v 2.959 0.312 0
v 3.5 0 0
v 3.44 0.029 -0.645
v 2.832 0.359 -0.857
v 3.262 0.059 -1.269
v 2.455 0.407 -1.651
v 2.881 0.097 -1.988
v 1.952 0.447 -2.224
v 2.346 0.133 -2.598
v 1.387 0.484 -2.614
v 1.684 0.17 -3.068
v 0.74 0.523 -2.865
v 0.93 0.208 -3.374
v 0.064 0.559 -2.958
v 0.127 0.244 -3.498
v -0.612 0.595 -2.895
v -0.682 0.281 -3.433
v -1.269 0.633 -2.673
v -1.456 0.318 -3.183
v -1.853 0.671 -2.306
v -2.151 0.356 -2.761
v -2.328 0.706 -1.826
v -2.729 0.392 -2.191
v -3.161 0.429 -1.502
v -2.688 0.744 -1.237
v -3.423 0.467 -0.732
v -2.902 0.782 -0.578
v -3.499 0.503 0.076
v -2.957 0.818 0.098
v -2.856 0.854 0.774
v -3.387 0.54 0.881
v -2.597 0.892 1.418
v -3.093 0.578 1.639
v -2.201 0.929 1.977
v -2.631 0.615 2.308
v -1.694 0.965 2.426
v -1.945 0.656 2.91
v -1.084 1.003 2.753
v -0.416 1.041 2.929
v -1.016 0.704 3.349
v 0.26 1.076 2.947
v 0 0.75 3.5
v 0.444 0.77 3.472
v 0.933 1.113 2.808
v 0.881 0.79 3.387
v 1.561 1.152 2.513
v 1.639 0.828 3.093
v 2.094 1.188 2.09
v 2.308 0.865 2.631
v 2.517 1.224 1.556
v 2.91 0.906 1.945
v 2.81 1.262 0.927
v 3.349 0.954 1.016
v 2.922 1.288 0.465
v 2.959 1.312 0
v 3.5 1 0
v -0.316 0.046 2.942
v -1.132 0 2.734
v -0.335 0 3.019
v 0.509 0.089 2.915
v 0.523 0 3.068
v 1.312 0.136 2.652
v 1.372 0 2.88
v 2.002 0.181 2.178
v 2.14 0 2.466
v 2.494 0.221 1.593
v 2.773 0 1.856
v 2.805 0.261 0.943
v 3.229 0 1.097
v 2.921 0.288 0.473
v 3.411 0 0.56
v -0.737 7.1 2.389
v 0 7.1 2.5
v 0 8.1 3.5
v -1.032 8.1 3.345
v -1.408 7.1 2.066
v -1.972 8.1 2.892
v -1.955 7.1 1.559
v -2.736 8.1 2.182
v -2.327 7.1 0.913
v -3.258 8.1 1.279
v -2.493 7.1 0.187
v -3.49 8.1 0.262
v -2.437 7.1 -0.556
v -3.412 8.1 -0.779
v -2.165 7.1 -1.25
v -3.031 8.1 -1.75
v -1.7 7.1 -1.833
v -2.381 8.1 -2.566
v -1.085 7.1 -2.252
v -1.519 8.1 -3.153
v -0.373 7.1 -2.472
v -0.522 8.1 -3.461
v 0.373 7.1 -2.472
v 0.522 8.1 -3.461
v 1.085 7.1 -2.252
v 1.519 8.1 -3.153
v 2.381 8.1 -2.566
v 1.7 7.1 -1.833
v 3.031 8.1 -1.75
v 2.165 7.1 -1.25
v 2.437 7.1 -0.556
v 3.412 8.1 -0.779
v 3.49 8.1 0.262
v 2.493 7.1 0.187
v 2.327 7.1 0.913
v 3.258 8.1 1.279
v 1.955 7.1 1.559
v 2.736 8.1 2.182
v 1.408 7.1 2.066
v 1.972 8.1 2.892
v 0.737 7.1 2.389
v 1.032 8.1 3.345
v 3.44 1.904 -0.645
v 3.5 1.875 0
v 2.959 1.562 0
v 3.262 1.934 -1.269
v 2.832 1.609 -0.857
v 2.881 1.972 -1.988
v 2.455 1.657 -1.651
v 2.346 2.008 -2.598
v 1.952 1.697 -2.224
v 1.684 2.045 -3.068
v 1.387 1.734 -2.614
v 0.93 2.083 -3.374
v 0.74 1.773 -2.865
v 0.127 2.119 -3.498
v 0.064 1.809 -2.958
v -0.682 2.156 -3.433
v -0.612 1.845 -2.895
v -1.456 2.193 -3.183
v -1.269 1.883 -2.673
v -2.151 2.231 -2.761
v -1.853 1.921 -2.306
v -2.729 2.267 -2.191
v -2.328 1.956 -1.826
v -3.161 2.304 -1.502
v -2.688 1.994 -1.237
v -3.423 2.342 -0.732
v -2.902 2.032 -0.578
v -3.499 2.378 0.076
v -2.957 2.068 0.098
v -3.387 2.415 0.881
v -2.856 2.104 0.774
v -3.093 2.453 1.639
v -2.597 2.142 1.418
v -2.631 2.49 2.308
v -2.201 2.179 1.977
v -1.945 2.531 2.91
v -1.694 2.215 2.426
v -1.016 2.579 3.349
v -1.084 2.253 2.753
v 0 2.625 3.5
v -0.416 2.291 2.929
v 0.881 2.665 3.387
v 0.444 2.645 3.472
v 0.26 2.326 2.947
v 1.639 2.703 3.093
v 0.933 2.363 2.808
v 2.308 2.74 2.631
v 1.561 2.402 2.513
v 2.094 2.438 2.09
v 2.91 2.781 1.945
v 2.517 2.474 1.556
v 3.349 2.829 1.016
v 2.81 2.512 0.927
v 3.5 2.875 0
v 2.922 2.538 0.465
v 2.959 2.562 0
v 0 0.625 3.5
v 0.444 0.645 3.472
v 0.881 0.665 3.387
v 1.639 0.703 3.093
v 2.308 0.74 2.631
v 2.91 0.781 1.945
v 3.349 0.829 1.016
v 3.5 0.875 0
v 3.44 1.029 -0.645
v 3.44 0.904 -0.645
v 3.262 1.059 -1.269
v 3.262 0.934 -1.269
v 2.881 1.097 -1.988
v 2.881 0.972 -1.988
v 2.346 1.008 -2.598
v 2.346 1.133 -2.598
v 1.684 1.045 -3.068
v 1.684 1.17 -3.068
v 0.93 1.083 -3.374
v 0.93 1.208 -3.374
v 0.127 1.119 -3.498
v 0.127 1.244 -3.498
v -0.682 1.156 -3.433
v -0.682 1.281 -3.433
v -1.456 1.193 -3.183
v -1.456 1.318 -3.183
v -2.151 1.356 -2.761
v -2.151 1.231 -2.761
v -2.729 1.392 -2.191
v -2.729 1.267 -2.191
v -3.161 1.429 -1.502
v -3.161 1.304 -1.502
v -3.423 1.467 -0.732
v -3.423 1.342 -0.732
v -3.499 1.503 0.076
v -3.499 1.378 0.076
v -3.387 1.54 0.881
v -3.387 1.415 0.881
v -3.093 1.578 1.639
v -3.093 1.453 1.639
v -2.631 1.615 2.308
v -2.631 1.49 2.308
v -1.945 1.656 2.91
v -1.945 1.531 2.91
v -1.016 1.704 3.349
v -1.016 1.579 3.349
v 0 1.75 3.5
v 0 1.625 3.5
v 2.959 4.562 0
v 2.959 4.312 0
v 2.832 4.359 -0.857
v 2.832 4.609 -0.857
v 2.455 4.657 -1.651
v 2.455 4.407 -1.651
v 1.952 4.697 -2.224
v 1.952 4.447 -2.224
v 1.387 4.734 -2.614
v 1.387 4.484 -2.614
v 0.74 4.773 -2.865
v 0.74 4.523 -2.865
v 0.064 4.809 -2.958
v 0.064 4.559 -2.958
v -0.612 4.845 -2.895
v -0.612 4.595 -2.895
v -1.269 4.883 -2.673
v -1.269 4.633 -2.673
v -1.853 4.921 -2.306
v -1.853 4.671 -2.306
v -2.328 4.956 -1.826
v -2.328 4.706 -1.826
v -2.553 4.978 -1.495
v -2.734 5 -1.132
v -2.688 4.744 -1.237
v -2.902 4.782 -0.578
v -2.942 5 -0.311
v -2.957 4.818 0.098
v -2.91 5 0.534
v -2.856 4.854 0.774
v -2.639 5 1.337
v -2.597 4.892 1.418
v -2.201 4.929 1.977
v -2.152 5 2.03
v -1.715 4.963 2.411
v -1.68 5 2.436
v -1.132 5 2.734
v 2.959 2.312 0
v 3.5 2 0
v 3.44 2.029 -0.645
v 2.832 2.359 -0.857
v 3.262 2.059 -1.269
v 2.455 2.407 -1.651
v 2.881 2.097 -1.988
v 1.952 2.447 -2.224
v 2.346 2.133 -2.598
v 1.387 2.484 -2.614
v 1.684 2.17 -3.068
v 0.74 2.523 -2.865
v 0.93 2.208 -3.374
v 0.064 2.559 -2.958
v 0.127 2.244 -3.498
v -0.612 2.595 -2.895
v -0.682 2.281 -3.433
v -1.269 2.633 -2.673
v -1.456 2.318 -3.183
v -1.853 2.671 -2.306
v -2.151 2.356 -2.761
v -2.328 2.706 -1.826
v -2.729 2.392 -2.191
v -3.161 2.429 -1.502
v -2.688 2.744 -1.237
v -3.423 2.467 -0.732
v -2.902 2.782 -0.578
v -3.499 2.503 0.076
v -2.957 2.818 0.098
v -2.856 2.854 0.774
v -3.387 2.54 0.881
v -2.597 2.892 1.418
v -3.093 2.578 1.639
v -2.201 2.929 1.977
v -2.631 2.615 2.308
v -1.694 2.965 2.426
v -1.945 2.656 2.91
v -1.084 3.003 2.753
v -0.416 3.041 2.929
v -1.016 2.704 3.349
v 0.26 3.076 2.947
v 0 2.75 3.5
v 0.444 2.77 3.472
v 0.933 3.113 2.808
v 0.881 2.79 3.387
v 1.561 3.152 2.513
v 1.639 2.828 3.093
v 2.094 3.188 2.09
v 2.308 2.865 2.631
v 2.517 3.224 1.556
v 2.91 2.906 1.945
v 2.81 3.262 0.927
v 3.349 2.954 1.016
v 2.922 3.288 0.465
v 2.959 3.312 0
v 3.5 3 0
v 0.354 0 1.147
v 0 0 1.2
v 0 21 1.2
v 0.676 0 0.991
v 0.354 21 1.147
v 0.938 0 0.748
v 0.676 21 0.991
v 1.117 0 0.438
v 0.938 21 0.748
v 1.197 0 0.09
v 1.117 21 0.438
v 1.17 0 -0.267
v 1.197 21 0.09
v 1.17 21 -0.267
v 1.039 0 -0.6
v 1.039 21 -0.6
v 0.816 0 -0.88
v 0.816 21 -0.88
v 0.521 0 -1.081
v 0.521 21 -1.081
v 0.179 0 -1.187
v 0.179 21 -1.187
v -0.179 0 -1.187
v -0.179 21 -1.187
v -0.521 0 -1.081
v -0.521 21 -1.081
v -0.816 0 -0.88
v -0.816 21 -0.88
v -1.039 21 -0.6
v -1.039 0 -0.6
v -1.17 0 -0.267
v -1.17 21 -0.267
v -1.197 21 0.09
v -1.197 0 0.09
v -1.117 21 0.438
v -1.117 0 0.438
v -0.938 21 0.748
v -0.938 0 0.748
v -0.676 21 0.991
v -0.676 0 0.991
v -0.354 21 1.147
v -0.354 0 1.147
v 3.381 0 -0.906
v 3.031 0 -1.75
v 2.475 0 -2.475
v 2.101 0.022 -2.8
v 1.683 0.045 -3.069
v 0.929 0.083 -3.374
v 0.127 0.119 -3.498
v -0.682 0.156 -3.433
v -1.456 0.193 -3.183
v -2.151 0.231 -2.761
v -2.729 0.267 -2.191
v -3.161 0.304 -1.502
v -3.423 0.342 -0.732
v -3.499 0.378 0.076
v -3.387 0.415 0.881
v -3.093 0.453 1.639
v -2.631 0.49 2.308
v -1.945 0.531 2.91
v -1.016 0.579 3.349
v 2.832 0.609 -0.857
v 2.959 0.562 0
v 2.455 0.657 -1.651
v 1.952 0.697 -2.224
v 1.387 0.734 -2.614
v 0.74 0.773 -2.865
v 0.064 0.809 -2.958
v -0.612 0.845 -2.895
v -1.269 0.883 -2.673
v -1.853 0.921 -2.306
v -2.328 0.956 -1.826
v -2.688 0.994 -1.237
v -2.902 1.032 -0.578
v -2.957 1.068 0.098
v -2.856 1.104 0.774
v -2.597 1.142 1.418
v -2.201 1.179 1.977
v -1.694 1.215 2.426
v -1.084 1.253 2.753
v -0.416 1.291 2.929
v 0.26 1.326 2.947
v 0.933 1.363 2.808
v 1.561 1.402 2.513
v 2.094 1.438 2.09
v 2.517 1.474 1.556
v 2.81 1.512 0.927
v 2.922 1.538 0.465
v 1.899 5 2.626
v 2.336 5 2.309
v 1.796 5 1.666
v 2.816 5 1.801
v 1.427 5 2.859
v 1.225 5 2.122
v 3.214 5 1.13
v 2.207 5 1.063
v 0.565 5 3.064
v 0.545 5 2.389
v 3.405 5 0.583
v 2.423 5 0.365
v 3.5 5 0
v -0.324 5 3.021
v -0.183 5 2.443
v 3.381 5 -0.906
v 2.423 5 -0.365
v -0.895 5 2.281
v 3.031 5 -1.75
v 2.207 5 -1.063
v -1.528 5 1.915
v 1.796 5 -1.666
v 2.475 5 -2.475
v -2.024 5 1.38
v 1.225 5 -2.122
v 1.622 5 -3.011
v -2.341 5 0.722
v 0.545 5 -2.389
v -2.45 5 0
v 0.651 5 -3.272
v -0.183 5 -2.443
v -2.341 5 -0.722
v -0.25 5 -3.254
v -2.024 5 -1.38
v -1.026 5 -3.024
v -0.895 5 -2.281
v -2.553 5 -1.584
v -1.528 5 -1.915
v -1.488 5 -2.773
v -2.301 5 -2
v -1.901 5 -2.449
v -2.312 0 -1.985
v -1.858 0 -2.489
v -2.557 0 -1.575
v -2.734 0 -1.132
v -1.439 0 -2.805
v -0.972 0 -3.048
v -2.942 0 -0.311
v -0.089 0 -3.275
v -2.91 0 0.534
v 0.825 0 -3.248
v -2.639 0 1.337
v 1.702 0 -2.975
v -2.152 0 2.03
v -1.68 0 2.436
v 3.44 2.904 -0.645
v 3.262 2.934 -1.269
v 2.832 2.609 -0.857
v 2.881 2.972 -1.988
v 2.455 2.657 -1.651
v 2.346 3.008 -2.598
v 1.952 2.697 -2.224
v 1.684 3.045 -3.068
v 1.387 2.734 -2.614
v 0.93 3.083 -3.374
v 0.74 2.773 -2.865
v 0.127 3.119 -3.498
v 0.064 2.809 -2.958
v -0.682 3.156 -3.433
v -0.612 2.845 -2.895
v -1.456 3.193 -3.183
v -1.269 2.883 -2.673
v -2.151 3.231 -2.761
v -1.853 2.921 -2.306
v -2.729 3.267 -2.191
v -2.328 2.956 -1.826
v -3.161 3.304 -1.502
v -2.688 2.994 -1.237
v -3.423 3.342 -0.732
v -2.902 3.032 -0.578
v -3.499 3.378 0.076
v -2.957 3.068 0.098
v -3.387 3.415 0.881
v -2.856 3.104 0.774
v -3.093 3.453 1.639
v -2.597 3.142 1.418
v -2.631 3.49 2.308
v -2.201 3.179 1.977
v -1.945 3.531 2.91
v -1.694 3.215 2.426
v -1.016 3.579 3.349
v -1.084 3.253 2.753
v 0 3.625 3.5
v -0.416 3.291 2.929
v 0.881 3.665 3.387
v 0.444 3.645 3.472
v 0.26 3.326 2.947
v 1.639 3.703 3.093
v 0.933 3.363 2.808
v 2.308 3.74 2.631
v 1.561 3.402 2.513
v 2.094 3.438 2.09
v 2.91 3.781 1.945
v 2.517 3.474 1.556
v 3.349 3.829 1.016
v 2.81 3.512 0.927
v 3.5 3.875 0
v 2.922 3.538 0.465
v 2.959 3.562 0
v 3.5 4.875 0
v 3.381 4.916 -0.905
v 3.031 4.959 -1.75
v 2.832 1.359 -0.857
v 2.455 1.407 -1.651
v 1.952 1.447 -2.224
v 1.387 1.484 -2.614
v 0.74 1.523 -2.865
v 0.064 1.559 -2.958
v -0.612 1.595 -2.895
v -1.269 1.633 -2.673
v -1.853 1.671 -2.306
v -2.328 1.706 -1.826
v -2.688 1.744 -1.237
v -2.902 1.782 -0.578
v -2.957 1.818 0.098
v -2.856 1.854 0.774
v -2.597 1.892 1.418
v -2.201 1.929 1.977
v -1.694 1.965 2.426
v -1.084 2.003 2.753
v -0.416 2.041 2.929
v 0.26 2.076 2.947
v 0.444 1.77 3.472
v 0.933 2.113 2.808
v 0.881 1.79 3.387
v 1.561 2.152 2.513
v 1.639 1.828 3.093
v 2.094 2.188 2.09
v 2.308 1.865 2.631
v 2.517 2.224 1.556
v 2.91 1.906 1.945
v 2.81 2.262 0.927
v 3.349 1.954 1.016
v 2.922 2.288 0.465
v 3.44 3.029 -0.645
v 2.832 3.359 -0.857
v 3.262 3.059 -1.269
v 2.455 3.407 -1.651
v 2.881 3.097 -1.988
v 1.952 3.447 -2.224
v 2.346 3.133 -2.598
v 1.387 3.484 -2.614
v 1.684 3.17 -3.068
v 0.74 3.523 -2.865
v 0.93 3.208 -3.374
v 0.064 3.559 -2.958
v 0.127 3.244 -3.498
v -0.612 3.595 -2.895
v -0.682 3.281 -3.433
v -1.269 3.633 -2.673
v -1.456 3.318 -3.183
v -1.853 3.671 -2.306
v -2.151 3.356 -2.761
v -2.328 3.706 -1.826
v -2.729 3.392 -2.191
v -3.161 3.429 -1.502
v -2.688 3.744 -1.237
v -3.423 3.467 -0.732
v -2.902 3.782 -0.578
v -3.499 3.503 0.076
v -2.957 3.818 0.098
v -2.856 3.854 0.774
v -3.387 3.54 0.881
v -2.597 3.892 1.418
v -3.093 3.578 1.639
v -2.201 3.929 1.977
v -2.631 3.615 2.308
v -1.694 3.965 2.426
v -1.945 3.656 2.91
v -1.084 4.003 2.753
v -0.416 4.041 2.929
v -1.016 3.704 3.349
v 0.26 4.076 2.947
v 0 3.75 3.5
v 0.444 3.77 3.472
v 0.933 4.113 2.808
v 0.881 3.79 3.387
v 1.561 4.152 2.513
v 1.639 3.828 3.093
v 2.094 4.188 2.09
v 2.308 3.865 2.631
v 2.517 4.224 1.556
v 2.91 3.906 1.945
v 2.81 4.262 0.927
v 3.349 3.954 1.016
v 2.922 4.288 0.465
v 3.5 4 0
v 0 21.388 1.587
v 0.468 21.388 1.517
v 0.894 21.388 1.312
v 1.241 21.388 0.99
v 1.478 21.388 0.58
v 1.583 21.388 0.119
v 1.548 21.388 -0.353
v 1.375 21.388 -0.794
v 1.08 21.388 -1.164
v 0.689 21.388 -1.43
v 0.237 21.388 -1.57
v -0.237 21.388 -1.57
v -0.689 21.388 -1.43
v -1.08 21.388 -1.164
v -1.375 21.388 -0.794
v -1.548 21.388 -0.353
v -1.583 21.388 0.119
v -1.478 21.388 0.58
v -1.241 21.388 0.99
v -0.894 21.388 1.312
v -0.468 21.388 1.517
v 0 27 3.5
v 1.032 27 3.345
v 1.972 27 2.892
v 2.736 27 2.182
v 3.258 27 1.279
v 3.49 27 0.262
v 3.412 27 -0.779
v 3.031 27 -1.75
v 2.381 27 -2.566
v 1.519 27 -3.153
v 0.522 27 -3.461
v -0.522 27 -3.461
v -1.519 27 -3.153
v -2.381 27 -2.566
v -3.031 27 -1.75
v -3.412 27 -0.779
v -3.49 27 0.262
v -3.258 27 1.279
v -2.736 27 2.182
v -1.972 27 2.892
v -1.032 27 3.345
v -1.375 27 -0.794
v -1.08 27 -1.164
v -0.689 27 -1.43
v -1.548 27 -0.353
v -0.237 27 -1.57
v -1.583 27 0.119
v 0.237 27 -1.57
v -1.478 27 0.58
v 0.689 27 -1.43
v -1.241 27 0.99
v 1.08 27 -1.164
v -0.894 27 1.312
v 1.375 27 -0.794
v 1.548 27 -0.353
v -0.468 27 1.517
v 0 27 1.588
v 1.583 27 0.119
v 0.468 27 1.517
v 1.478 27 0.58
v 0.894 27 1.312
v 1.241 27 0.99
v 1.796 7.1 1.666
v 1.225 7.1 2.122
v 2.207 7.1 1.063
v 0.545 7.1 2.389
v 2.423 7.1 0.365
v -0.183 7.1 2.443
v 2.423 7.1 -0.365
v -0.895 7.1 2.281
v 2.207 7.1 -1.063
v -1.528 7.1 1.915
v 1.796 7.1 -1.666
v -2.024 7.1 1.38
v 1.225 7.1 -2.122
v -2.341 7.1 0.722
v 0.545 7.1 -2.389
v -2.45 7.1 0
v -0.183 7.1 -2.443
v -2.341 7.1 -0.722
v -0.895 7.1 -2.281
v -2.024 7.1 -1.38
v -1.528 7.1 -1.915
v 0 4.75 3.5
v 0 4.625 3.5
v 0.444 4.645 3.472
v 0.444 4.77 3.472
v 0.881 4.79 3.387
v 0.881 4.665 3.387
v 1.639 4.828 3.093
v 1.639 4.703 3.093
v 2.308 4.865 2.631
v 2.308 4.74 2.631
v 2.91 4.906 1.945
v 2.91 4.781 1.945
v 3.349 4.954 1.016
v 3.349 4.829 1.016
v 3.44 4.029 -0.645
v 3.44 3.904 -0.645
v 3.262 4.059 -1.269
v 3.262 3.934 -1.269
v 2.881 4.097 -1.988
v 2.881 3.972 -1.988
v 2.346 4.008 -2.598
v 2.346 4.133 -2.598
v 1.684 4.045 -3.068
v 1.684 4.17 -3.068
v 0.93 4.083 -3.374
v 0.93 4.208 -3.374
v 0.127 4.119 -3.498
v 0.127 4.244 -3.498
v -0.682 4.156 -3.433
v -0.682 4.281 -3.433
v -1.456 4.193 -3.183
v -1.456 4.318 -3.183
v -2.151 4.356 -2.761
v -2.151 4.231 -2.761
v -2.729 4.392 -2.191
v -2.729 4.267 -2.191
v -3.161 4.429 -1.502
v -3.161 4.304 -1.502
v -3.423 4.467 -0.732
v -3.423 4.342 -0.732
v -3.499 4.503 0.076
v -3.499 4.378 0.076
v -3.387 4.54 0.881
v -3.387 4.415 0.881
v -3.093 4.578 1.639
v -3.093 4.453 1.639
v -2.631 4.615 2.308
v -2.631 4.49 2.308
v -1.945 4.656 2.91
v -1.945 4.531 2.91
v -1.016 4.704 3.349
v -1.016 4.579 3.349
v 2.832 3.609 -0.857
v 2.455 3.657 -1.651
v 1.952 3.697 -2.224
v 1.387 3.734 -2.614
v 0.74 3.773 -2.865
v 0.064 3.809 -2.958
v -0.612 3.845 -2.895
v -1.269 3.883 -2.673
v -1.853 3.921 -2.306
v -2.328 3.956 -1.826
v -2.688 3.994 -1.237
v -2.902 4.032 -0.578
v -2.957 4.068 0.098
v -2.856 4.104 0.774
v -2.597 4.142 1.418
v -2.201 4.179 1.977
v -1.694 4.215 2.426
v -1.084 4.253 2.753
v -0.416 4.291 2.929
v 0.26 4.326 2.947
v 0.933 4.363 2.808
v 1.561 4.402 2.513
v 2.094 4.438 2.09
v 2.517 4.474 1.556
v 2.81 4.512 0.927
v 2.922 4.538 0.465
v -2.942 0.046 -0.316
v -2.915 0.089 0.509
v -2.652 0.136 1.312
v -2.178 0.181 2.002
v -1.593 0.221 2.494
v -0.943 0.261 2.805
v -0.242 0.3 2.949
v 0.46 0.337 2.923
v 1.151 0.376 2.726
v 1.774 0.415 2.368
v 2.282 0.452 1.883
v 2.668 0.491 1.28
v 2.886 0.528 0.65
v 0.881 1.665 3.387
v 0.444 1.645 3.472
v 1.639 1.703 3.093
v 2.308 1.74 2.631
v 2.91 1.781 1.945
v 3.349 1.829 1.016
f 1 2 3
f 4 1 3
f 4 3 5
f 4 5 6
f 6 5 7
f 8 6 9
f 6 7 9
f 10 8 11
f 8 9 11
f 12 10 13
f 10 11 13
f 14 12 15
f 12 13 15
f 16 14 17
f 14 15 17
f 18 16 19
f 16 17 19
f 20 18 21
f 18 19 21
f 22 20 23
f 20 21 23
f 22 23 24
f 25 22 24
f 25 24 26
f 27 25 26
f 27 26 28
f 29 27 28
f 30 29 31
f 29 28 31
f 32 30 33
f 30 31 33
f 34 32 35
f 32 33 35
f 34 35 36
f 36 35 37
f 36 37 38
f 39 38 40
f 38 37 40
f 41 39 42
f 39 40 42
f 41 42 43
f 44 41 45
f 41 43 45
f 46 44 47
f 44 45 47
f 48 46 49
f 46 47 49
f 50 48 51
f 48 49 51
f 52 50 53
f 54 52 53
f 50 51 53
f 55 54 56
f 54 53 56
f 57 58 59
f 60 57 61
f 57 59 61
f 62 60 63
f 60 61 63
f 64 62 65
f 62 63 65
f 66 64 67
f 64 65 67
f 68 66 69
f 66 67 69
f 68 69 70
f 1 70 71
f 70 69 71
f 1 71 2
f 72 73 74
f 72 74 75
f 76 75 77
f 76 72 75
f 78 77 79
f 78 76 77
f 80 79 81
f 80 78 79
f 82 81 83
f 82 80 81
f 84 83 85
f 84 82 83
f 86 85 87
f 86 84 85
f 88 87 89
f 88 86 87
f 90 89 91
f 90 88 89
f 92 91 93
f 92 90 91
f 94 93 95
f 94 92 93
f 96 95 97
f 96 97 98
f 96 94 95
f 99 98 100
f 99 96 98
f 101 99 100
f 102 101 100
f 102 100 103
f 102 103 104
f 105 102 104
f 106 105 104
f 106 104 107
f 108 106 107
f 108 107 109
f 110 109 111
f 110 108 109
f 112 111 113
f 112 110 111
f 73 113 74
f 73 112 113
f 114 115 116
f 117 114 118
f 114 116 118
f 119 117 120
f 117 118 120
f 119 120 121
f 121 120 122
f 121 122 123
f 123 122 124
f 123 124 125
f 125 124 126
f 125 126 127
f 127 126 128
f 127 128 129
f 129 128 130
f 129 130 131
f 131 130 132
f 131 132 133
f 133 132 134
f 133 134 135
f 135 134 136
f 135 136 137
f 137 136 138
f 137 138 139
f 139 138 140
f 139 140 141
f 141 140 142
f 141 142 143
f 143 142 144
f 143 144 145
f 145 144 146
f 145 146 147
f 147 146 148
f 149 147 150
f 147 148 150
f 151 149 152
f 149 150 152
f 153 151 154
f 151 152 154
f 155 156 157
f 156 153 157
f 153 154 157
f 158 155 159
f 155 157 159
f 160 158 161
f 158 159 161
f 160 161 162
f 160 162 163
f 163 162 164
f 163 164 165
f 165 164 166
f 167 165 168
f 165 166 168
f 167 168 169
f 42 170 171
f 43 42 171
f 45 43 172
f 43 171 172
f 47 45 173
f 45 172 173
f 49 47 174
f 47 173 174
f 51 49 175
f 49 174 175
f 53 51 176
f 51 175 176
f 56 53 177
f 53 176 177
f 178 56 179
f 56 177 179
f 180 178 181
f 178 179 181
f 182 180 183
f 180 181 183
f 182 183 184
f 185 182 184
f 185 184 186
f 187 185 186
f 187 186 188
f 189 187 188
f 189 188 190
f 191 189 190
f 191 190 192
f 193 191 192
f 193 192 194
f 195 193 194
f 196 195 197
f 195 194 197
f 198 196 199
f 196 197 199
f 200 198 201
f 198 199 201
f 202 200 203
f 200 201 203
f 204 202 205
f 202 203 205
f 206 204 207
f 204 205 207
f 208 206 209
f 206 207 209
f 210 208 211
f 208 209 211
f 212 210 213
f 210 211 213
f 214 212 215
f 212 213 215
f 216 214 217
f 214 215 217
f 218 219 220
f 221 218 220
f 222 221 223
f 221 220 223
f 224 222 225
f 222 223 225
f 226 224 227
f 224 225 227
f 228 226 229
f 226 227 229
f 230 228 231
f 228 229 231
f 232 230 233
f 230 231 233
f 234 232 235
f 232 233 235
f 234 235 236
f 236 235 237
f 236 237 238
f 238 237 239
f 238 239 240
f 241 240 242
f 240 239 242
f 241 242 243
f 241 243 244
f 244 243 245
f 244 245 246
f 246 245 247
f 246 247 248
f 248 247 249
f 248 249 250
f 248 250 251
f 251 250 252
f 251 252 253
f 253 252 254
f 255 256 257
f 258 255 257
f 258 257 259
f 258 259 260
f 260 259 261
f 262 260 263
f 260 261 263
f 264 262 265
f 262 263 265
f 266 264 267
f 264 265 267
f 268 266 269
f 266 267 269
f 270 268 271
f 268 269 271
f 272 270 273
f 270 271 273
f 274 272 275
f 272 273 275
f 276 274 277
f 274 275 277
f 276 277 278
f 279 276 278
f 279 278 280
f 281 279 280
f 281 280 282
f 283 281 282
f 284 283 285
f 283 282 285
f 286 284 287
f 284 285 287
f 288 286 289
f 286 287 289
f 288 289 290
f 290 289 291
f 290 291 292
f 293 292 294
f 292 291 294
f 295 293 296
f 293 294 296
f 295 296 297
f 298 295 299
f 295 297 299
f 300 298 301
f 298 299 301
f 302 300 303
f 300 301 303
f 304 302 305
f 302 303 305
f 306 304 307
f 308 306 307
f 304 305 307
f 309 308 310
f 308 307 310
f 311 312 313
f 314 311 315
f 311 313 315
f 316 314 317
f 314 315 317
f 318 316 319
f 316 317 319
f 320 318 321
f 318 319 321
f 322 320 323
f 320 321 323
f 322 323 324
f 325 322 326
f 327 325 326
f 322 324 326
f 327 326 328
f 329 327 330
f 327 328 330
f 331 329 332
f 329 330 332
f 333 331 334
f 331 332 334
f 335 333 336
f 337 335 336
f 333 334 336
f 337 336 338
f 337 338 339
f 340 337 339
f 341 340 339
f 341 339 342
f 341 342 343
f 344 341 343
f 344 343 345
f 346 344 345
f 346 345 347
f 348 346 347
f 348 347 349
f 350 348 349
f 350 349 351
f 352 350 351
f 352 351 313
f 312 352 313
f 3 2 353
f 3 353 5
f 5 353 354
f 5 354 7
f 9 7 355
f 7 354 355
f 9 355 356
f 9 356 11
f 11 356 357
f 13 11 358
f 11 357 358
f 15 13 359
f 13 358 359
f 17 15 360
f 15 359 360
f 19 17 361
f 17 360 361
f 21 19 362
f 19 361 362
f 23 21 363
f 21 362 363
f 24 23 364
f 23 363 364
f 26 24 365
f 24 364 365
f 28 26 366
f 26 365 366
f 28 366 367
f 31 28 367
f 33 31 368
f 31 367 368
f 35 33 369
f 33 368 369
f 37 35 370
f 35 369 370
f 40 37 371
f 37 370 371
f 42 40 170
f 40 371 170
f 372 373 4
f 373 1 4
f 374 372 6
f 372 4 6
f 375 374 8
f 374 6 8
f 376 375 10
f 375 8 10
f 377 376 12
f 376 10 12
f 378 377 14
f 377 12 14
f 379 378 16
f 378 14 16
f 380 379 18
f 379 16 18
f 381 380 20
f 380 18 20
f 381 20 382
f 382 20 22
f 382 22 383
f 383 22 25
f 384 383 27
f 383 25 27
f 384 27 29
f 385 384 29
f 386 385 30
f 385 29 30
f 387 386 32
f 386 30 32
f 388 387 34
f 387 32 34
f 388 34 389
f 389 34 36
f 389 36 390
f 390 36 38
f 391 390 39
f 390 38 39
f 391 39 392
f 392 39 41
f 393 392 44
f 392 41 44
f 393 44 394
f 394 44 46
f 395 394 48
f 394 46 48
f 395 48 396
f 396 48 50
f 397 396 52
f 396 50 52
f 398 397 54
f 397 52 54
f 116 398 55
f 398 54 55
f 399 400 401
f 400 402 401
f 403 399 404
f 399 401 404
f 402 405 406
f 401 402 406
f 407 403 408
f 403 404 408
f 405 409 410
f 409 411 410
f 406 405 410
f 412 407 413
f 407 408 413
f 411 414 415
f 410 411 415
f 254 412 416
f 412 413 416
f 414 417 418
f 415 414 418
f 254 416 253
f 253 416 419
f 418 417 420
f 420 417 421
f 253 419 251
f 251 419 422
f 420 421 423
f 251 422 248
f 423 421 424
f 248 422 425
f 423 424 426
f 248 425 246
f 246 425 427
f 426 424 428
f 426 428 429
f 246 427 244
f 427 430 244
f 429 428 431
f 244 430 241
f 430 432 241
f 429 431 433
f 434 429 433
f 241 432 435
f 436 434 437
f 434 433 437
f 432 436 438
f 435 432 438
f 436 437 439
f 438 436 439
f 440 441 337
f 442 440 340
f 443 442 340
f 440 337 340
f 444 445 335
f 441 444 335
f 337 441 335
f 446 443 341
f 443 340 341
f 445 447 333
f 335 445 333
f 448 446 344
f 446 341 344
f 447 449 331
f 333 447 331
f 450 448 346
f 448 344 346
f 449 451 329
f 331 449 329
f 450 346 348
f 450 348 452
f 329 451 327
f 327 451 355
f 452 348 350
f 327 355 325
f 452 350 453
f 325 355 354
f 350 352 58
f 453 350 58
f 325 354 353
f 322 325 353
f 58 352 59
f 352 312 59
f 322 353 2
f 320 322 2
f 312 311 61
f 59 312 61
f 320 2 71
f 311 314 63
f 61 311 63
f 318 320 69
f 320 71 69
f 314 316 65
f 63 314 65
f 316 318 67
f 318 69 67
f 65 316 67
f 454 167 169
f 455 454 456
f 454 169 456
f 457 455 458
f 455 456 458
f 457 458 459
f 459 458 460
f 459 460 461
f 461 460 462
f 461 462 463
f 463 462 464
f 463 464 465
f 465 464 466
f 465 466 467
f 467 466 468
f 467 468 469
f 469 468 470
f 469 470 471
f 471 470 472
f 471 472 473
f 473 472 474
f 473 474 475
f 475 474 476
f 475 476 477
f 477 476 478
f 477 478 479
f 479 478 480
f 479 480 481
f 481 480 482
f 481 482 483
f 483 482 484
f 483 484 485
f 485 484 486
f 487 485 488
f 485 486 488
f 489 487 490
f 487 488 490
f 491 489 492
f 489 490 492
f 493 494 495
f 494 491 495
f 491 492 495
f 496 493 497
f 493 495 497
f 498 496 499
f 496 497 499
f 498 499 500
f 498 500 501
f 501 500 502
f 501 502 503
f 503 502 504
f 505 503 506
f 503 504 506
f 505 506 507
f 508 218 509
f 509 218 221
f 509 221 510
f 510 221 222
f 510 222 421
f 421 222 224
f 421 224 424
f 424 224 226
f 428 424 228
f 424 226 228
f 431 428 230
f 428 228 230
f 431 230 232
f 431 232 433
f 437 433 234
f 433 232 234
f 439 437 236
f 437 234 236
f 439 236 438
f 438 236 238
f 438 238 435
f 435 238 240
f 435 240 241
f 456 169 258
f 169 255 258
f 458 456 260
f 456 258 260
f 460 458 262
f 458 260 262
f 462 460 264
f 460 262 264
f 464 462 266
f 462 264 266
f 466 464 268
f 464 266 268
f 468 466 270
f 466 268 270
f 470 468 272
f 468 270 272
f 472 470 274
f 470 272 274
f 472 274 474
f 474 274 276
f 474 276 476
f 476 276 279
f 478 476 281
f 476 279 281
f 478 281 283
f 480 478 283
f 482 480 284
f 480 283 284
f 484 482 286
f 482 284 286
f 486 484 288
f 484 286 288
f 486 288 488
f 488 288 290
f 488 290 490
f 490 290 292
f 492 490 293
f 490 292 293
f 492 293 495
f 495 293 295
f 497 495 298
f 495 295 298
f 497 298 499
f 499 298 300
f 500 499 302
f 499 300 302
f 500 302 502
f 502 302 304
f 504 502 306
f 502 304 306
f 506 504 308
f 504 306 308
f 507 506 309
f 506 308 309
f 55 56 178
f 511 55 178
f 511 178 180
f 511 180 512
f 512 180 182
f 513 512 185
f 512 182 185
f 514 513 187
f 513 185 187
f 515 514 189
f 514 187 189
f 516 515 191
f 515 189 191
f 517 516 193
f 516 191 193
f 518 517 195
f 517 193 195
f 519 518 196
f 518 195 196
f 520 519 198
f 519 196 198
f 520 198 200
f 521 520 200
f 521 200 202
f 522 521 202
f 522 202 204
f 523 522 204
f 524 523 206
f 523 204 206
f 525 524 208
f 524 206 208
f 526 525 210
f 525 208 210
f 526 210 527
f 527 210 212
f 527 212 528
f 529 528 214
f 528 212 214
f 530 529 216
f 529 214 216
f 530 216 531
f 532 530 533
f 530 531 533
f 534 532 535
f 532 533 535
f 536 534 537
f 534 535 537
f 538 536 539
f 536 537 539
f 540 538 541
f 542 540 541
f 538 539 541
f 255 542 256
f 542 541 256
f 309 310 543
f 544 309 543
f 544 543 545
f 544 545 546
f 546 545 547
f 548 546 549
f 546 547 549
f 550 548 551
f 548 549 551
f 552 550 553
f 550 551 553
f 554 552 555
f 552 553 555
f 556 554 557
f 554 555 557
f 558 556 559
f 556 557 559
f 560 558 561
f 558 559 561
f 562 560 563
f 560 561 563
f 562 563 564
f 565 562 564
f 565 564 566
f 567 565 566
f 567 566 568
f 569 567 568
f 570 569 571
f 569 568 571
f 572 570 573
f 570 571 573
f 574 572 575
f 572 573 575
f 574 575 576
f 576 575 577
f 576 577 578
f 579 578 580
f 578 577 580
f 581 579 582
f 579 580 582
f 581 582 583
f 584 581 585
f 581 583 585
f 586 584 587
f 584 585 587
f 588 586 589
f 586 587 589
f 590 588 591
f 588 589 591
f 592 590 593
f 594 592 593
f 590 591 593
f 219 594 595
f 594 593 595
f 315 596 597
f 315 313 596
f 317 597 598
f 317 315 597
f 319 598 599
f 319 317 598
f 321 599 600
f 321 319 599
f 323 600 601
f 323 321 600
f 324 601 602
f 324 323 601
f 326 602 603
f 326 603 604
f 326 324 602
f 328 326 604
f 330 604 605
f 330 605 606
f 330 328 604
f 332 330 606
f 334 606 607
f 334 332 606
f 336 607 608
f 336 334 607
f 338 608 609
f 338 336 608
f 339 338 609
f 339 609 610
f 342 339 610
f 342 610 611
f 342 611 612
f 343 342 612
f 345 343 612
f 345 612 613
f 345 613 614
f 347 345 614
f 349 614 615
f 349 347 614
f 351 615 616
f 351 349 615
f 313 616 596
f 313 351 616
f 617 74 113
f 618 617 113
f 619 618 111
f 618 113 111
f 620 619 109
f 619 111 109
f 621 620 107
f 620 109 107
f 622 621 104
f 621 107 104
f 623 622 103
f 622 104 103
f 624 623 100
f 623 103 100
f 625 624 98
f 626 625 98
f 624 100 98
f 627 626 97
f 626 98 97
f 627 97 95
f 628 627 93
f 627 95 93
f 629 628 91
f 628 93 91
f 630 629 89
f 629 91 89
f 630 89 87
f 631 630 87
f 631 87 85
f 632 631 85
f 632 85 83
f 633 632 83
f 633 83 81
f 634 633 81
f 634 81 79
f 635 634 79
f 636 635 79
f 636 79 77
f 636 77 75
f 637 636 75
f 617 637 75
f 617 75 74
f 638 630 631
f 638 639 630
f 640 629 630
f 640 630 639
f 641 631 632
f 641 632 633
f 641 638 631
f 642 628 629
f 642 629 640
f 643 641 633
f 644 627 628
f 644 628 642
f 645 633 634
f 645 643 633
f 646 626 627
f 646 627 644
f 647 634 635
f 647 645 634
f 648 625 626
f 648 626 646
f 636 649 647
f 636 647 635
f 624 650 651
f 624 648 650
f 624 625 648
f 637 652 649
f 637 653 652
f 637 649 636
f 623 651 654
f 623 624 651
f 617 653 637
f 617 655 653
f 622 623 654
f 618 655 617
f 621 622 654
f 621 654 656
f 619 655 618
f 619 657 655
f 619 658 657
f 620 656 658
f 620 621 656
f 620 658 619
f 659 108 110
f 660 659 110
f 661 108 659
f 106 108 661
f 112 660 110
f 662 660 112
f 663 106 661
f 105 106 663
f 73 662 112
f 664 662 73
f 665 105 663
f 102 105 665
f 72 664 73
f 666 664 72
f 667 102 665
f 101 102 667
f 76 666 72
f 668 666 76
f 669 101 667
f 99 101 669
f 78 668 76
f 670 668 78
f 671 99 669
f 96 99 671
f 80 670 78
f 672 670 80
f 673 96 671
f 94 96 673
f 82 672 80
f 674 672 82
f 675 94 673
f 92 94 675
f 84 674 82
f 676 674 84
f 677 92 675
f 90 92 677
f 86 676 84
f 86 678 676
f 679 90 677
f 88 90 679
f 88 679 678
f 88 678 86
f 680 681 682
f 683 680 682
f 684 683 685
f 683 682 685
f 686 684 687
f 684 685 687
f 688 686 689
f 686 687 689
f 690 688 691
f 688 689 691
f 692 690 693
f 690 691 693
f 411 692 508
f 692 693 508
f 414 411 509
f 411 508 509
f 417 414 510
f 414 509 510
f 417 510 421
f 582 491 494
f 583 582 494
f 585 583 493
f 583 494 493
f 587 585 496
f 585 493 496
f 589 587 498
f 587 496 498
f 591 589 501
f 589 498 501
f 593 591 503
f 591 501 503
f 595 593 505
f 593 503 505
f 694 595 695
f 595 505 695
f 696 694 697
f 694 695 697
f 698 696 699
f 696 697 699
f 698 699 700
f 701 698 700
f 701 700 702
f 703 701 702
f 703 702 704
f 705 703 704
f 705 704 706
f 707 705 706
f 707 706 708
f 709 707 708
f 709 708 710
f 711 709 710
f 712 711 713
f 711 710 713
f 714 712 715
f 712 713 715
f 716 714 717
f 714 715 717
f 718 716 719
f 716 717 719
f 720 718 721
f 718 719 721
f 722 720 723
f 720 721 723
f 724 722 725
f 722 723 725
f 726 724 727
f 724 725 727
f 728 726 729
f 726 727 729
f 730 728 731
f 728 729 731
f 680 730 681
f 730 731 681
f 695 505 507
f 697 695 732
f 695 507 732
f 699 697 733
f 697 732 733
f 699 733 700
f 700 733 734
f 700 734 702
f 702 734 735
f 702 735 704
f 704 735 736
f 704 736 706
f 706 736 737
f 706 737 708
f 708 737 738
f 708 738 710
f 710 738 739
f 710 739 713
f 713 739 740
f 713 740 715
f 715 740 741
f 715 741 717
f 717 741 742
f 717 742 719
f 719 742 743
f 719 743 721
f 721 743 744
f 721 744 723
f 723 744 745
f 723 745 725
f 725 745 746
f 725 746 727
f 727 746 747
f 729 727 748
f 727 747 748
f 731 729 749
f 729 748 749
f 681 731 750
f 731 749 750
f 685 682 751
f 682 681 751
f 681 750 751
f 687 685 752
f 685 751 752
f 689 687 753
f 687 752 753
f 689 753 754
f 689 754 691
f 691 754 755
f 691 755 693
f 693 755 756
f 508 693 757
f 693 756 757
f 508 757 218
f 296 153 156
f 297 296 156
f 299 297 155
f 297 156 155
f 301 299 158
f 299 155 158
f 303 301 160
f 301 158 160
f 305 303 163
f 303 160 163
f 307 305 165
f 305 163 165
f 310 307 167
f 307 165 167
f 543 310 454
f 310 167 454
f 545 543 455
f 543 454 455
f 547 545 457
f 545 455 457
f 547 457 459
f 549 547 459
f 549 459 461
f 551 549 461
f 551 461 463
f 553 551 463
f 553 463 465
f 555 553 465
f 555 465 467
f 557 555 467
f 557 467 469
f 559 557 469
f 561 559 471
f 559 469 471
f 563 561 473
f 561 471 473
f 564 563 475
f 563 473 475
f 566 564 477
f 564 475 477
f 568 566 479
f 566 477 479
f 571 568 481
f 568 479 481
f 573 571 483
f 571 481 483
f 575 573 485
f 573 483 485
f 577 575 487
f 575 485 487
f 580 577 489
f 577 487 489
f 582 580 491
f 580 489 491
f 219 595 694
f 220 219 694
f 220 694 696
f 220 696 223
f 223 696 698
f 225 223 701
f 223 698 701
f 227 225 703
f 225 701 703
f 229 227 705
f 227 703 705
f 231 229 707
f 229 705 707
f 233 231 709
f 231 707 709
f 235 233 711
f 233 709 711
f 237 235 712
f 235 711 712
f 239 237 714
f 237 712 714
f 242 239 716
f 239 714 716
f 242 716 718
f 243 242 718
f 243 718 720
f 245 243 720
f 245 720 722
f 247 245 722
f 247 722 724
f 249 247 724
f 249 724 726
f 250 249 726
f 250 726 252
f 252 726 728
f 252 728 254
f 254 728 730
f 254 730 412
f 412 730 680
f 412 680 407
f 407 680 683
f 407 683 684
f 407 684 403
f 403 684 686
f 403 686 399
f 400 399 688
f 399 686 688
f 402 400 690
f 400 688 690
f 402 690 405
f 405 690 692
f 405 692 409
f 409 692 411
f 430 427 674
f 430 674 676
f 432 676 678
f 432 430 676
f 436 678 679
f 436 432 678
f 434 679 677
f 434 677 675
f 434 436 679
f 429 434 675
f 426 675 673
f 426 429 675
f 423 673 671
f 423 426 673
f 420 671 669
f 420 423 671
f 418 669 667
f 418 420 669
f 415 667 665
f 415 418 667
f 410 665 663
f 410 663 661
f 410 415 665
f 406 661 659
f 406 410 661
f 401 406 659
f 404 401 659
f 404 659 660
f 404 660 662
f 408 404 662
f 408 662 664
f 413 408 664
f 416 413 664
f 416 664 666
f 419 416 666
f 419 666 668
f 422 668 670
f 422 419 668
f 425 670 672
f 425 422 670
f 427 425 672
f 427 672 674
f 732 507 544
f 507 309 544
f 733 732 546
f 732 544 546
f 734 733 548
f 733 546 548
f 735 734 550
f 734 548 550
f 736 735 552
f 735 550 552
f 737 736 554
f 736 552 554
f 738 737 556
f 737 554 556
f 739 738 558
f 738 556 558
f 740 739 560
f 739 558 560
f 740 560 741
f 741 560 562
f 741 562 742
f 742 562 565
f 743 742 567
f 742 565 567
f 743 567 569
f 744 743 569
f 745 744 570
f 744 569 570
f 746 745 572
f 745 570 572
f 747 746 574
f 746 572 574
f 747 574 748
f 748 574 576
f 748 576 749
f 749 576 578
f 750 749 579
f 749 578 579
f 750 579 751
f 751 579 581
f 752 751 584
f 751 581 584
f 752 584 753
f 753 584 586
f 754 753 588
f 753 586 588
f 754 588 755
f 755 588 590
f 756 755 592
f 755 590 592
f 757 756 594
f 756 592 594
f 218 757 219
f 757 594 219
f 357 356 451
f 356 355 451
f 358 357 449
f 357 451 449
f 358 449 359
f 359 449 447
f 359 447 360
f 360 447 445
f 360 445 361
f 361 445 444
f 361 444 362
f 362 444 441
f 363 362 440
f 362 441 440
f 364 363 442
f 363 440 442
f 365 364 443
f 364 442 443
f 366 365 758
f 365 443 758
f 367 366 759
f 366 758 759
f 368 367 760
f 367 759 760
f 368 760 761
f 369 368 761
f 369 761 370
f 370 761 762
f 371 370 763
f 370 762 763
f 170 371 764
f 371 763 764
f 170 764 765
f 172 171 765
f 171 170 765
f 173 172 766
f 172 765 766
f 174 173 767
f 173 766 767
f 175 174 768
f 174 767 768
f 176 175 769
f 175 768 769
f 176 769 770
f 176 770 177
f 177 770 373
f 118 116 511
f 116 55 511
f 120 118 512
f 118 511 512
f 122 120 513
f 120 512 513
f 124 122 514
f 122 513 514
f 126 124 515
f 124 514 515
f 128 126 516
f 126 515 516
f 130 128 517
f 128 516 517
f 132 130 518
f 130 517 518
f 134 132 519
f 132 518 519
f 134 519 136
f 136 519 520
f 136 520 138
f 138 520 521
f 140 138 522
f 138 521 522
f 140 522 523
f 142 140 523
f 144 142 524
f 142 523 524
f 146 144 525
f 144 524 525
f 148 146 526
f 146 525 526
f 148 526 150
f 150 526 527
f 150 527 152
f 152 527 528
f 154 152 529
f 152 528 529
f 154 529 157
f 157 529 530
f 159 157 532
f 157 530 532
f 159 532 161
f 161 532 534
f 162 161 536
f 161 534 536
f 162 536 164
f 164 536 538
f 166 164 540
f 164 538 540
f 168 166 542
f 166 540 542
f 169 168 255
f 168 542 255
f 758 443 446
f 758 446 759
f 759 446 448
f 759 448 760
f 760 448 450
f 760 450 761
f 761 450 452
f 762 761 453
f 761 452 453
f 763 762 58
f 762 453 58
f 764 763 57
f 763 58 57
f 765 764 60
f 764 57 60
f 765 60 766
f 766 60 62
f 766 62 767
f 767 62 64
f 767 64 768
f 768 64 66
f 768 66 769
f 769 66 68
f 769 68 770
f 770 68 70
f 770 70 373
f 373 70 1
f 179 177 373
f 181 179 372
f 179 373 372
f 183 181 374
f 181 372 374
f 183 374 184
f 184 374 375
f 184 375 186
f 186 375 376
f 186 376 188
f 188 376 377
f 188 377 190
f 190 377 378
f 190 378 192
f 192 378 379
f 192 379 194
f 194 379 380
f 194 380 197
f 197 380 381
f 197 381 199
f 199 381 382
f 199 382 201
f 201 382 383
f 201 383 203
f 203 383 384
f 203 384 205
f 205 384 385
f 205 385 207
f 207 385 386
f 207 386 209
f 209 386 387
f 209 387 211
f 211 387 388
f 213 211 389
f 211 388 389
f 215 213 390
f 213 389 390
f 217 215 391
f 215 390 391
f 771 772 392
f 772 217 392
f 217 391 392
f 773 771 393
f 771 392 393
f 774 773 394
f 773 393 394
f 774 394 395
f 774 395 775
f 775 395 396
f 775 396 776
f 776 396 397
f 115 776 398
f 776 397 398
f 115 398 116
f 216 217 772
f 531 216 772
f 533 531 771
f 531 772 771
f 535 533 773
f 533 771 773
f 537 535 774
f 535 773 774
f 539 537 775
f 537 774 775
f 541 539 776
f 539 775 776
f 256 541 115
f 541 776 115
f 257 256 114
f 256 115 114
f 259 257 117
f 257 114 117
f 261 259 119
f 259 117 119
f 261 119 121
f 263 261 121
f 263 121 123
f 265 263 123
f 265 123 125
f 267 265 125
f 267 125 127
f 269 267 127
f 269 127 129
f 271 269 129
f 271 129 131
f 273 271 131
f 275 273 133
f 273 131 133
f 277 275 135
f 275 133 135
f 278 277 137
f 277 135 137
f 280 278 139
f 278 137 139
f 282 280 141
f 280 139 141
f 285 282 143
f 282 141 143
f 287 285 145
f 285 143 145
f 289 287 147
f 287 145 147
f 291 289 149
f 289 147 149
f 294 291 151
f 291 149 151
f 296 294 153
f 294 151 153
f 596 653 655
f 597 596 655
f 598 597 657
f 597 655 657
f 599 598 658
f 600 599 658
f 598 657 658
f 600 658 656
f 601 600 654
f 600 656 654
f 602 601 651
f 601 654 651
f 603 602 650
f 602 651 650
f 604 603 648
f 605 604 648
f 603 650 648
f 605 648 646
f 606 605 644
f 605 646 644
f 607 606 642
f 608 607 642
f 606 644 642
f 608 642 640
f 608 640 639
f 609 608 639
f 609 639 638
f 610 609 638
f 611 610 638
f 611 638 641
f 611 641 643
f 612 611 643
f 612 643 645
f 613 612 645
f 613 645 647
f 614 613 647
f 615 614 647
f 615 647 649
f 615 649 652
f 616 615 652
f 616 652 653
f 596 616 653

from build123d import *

# Parameters (mm, degrees)
CROQUIS2_R                   = 3.5
SALIENTE_EXTRUIR1_DEPTH      = 27
ROSCA1_PITCH                 = 1
CROQUIS5_R                   = 12.45
CROQUIS5_R_2                 = 2.45
CORTAR_EXTRUIR_L_MINA1_DEPTH = 2.1
CROQUIS6_R                   = 1.2
CORTAR_EXTRUIR1_DEPTH        = 28.449954628
CHAFL_N1_SIZE                = 1
CROQUIS8_R                   = 1.5875
CORTAR_EXTRUIR2_DEPTH        = 5
CHAFL_N2_SIZE                = 1


with BuildPart() as part:
    # Croquis2 → Saliente-Extruir1 (new body)
    with BuildSketch(Plane(origin=(0, 0, 0), x_dir=(1, 0, 0), z_dir=(0, 1, 0))):
        with Locations(Location((0, 0, 0), (0, 0, 270))):
            Circle(CROQUIS2_R)
    extrude(amount=SALIENTE_EXTRUIR1_DEPTH)

    # Rosca1: the profile of Perfil de rosca1 profile screwed along a right-hand helix of 6 turns, 8 arcs to a turn; built about Z, then put on its axis
    rosca1_z = Axis((0, 0, 0), (0, 0, 1))
    rosca1_corners = [(3.5003, 0, -0.000173205), (3.5003, 0, 0.875173202), (2.958734125, 0, 0.562499999), (2.958734125, 0, 0.312499999)]
    with BuildLine(mode=Mode.PRIVATE) as rosca1_profile:
        Line(rosca1_corners[0], rosca1_corners[1])
        Line(rosca1_corners[1], rosca1_corners[2])
        Line(rosca1_corners[2], rosca1_corners[3])
        Line(rosca1_corners[3], rosca1_corners[0])
    rosca1_cap = Face(rosca1_profile.wire())
    rosca1_turn_angles = [0, 22.5, 45, 67.5, 90, 112.5, 135, 157.5, 180, 202.5, 225, 247.5, 270, 292.5, 315, 337.5, 360]
    rosca1_turn_weights = [1, 0.9238795325112867, 1, 0.9238795325112867, 1, 0.9238795325112867, 1, 0.9238795325112867, 1, 0.9238795325112867, 1, 0.9238795325112867, 1, 0.9238795325112867, 1, 0.9238795325112867, 1]
    rosca1_turn_rails = [Edge.make_bspline([Vector(p[0], p[1], 0).rotate(rosca1_z, rosca1_turn_angles[k]) / rosca1_turn_weights[k] + Vector(0, 0, p[2] + ROSCA1_PITCH * rosca1_turn_angles[k] / 360) for k in range(17)], [0, 0, 0, 1, 1, 2, 2, 3, 3, 4, 4, 5, 5, 6, 6, 7, 7, 8, 8, 8], 2, rosca1_turn_weights) for p in rosca1_corners]
    rosca1_turn_sides = [Face.make_surface_from_curves(rosca1_turn_rails[p[0]], rosca1_turn_rails[p[1]]) for p in [(0, 1), (1, 2), (2, 3), (3, 0)]]
    rosca1 = Plane(origin=(0, -1, 0), x_dir=(1, 0, 0), z_dir=(0, 1, 0)) * Solid(Shell([*[p.moved(Location((0, 0, ROSCA1_PITCH * i))) for i in range(6) for p in rosca1_turn_sides], rosca1_cap, rosca1_cap.rotate(rosca1_z, 2160).moved(Location((0, 0, ROSCA1_PITCH * 2160 / 360)))]))
    add(rosca1, mode=Mode.SUBTRACT)

    # Croquis5 → Cortar-Extruir-Lámina1 (cut)
    with BuildSketch(Plane(origin=(0, 5, 0), x_dir=(-1, 0, 0), z_dir=(0, -1, 0))):
        Circle(CROQUIS5_R)
        Circle(CROQUIS5_R_2, mode=Mode.SUBTRACT)
    extrude(amount=-CORTAR_EXTRUIR_L_MINA1_DEPTH, mode=Mode.SUBTRACT)

    # Croquis6 → Cortar-Extruir1 (cut, through all)
    with BuildSketch(Plane(origin=(0, 27, 0), x_dir=(1, 0, 0), z_dir=(0, 1, 0))):
        with Locations(Location((0, 0, 0), (0, 0, 270))):
            Circle(CROQUIS6_R)
    extrude(amount=-CORTAR_EXTRUIR1_DEPTH, mode=Mode.SUBTRACT)

    # Chaflán1
    chafl_n1_edges = [part.edges().sort_by_distance(p)[0] for p in [
        (0, 7.1, -3.5),
    ]]
    chamfer(chafl_n1_edges, length=CHAFL_N1_SIZE)

    # Croquis8 → Cortar-Extruir2 (cut)
    with BuildSketch(Plane(origin=(0, 27, 0), x_dir=(1, 0, 0), z_dir=(0, 1, 0))):
        with Locations(Location((0, 0, 0), (0, 0, 270))):
            Circle(CROQUIS8_R)
    extrude(amount=-CORTAR_EXTRUIR2_DEPTH, mode=Mode.SUBTRACT)

    # Chaflán2
    # the kernel refuses this chamfer: 1 mm, written as the material it takes off along each edge
    with BuildSketch(Plane(origin=(0, 22, 0), x_dir=(0, 0, 1), z_dir=(-1, 0, 0))) as chafl_n2_piece_1_section:
        Polygon((1.2 + CHAFL_N2_SIZE, 0), (1.2, -CHAFL_N2_SIZE), (1.2, 0), align=None)
    chafl_n2_piece_1 = revolve(axis=Axis((0, 22, 0), (0, 1, 0)), mode=Mode.PRIVATE)
    chafl_n2_piece_1 = chafl_n2_piece_1 & Plane(origin=(0, 21.189751439, 0), x_dir=(0, 0, 1), z_dir=(0, 1, 0)) * Cylinder(1.5875, 9, mode=Mode.PRIVATE)
    add(chafl_n2_piece_1, mode=Mode.SUBTRACT)


solid = part.part
